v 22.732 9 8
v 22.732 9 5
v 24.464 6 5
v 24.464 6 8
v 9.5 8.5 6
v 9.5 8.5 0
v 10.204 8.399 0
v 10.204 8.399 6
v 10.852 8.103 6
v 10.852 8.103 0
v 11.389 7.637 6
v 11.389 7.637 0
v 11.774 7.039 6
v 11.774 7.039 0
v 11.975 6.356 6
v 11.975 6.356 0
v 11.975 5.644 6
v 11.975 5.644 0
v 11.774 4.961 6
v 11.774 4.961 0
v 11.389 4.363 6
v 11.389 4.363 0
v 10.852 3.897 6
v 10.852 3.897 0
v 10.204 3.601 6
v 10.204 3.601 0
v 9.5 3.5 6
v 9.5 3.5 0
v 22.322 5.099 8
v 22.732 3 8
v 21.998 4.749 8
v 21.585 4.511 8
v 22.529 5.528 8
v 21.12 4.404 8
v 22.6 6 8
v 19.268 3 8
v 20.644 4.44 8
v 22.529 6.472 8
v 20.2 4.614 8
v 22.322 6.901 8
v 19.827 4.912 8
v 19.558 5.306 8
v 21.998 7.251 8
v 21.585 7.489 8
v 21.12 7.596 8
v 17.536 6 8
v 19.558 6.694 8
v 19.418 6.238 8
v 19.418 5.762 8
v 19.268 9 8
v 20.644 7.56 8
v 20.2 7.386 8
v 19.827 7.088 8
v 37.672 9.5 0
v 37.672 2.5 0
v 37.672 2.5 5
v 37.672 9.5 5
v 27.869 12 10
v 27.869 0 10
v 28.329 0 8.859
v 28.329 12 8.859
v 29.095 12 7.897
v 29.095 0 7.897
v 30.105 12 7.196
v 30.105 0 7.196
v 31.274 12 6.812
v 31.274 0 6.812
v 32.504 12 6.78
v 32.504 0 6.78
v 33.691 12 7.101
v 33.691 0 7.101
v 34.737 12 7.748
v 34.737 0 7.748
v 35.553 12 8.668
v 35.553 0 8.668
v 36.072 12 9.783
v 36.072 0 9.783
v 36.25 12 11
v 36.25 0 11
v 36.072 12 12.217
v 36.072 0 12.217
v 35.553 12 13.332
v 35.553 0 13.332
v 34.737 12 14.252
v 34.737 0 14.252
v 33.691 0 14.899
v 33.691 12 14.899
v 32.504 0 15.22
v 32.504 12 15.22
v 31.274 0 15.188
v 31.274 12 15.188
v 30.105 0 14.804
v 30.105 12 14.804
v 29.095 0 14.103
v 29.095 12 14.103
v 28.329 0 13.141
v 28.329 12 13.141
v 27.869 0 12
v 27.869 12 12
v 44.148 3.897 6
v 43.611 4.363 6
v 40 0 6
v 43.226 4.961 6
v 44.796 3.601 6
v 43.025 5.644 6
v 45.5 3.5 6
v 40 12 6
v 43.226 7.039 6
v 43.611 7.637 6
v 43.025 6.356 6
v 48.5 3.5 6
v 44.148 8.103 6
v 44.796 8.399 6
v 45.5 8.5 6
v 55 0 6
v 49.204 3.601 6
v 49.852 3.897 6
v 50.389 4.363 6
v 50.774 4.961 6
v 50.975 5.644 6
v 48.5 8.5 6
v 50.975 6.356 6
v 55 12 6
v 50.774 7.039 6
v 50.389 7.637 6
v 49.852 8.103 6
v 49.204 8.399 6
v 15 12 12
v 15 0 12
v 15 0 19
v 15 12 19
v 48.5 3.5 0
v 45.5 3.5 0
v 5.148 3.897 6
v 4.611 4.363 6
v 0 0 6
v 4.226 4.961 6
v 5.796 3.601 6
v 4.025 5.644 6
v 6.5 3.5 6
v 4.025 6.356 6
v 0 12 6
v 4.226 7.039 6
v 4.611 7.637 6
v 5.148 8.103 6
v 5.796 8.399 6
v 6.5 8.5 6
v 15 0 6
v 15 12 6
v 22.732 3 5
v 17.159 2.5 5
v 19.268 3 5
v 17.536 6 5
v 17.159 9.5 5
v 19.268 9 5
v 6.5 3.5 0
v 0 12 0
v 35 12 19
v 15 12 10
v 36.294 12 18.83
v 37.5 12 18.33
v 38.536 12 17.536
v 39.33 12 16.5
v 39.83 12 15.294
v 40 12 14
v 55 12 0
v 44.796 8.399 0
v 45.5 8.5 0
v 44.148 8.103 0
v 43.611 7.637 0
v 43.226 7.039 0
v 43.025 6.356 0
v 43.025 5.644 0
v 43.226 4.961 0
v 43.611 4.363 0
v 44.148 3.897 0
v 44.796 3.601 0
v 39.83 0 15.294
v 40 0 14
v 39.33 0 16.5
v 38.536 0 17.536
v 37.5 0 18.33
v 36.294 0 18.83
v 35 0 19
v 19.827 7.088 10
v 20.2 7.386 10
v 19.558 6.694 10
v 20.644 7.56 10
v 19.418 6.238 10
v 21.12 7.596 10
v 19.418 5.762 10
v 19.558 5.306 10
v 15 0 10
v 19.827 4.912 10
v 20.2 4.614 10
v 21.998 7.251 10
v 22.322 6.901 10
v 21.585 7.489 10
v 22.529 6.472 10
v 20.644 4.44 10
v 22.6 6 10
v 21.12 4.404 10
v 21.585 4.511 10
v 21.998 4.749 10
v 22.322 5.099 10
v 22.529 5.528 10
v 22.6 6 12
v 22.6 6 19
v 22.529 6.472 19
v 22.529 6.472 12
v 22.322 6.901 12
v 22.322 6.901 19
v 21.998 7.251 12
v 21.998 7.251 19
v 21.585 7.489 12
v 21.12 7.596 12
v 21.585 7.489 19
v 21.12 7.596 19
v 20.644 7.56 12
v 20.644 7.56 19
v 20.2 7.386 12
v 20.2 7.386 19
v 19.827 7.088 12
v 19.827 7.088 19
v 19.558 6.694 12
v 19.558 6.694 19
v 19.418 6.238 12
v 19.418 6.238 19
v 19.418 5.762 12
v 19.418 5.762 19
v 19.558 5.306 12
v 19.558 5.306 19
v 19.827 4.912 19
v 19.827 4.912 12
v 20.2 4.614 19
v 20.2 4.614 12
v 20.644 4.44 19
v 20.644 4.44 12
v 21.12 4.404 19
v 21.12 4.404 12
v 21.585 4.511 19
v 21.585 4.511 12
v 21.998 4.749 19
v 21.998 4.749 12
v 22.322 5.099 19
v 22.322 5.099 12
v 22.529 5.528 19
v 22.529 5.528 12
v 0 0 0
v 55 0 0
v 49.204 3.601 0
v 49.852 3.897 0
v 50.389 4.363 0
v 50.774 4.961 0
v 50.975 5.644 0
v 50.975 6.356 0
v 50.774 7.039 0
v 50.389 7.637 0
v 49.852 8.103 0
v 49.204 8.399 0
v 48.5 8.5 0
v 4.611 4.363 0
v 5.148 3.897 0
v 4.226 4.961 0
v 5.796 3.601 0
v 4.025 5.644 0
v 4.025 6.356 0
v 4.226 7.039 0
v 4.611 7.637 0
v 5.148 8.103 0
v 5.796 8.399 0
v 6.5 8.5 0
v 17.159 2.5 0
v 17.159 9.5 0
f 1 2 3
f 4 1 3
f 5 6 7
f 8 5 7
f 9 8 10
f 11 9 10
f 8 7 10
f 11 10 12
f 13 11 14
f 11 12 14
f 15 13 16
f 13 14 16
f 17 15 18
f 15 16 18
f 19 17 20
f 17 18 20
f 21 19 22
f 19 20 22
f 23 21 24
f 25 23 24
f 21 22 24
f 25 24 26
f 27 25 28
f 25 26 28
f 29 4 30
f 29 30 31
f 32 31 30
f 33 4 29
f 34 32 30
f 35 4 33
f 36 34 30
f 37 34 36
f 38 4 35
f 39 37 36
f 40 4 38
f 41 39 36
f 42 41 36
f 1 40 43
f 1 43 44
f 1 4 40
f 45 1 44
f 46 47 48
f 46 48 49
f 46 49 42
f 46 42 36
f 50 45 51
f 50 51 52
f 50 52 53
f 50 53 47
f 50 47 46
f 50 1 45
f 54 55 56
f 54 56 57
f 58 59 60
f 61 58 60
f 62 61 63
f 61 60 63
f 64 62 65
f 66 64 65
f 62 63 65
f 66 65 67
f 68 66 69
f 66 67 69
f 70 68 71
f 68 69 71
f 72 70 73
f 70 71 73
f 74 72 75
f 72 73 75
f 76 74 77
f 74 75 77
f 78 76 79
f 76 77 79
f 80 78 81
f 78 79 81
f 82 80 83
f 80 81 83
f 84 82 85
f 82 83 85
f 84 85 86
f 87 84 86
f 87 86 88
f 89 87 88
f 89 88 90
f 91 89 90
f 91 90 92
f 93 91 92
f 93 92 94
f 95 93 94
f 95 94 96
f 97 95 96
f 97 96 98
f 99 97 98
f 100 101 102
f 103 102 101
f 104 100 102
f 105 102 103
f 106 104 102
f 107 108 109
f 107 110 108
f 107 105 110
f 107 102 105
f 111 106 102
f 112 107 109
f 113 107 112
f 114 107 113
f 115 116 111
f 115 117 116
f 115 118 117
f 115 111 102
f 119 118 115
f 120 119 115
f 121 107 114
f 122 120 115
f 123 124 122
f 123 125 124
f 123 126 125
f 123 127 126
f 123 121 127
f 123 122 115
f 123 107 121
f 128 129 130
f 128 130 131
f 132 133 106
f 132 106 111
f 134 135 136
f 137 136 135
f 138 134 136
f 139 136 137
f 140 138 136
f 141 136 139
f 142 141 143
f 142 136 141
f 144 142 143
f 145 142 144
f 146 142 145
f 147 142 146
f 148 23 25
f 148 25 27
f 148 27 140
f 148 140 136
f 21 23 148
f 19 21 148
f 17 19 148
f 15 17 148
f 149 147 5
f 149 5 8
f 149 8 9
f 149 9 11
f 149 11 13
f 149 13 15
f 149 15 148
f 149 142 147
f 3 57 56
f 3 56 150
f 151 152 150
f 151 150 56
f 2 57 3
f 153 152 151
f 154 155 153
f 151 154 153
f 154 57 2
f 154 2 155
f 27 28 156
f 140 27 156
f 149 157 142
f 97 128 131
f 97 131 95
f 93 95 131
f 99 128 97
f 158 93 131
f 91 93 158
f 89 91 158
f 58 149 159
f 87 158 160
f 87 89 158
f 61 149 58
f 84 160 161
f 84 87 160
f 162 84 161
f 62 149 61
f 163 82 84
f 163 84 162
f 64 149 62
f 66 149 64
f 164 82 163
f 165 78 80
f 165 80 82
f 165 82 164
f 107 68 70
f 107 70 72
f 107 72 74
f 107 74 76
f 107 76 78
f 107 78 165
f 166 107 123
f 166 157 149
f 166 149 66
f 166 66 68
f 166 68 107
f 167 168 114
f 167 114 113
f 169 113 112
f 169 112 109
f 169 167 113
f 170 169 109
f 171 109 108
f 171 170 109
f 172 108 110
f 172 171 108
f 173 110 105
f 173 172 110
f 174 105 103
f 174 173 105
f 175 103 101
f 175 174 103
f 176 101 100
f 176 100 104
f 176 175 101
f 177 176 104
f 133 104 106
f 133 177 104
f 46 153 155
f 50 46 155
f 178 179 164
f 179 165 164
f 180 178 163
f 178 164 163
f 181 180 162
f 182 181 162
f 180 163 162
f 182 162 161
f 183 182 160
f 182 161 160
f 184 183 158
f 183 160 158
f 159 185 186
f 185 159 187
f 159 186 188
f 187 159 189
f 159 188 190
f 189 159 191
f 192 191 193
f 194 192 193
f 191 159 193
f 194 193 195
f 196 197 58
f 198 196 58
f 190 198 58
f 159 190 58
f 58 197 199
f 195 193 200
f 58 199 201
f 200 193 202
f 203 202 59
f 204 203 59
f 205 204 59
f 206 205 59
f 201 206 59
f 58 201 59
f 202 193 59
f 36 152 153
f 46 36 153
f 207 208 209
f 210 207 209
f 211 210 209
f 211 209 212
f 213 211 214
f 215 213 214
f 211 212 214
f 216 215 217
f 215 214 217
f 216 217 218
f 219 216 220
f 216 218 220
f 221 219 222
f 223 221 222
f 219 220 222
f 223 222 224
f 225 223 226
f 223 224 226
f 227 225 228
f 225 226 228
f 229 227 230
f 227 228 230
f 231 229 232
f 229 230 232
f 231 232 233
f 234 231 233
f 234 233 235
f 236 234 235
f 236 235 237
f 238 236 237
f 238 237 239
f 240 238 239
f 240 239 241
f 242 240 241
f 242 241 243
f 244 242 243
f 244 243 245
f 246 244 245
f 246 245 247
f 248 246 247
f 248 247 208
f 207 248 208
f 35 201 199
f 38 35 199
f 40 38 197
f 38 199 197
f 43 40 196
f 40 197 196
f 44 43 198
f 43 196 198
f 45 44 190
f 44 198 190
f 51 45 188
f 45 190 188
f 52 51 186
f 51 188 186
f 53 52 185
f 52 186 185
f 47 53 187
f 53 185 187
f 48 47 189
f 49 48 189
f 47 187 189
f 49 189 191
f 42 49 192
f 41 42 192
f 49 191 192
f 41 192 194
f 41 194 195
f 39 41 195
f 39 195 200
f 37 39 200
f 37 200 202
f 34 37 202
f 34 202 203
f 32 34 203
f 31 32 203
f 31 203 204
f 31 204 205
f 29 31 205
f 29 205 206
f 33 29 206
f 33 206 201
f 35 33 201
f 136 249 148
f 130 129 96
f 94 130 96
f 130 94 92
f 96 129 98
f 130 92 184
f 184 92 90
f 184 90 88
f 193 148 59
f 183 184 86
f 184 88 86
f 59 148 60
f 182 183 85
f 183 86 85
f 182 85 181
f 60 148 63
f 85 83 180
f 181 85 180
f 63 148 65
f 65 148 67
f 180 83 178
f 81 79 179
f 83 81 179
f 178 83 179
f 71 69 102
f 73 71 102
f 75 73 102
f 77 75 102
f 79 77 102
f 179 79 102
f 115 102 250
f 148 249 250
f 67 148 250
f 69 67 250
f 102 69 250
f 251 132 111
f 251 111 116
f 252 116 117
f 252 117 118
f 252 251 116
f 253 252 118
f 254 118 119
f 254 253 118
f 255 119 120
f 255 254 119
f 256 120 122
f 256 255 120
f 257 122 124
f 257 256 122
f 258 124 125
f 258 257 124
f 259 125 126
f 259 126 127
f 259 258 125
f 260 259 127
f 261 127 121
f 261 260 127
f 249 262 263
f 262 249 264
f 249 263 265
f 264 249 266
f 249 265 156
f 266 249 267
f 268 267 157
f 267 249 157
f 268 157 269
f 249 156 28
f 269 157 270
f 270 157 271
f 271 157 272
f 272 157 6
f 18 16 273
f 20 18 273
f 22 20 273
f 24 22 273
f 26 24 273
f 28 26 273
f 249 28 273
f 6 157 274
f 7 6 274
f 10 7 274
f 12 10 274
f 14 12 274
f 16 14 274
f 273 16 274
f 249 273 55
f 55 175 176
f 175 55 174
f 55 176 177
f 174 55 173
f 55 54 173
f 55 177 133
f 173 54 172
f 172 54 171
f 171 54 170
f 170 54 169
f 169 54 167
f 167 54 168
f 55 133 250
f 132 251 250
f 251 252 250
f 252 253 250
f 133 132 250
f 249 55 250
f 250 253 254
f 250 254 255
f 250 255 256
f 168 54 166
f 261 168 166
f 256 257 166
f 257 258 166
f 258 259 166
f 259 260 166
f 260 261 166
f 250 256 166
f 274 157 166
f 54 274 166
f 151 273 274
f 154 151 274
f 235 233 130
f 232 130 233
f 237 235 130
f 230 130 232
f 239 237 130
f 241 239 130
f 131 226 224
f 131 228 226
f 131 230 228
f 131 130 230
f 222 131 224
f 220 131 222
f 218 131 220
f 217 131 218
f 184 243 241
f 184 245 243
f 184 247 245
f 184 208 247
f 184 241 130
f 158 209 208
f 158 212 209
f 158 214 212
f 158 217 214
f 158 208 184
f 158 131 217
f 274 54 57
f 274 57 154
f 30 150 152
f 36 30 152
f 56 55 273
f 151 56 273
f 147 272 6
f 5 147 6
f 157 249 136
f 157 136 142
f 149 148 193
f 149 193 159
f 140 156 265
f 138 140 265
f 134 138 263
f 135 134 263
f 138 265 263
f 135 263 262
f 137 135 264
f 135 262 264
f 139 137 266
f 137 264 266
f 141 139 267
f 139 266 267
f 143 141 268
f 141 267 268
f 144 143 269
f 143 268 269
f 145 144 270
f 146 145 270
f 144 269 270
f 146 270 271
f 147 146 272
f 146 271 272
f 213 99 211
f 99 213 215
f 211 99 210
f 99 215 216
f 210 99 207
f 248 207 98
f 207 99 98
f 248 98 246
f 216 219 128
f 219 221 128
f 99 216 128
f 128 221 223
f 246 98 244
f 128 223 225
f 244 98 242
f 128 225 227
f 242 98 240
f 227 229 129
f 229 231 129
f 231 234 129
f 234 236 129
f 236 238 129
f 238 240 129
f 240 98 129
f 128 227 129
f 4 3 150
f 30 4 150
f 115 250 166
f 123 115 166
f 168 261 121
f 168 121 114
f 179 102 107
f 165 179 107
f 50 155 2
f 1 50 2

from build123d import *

# Parameters (mm, degrees)
SKETCH2_W           = 55
SKETCH2_H           = 12
BOSS_EXTRUDE1_DEPTH = 6
SKETCH3_W           = 25
SKETCH3_H           = 12
BOSS_EXTRUDE2_DEPTH = 13
FILLET1_R           = 5
SKETCH4_R           = 4.25
CUT_EXTRUDE2_DEPTH  = 30
SKETCH5_W           = 20.513890507
SKETCH5_H           = 7
CUT_EXTRUDE3_DEPTH  = 5
SKETCH6_R           = 1.6
CUT_EXTRUDE4_DEPTH  = 11
CUT_EXTRUDE5_DEPTH  = 3


with BuildPart() as part:
    # Sketch2 → Boss-Extrude1 (new body)
    with BuildSketch(Plane.XY):
        with Locations((27.5, 6)):
            Rectangle(SKETCH2_W, SKETCH2_H)
        with BuildLine():
            Line((6.5, 8.5), (9.5, 8.5))
            ThreePointArc((9.5, 8.5), (12, 6), (9.5, 3.5))
            Line((9.5, 3.5), (6.5, 3.5))
            ThreePointArc((6.5, 3.5), (4, 6), (6.5, 8.5))
        make_face(mode=Mode.SUBTRACT)
        with BuildLine():
            Line((48.5, 8.5), (45.5, 8.5))
            ThreePointArc((45.5, 8.5), (43, 6), (45.5, 3.5))
            Line((45.5, 3.5), (48.5, 3.5))
            ThreePointArc((48.5, 3.5), (51, 6), (48.5, 8.5))
        make_face(mode=Mode.SUBTRACT)
    extrude(amount=BOSS_EXTRUDE1_DEPTH)

    # Sketch3 → Boss-Extrude2 (add)
    with BuildSketch(Plane.XY.offset(6)):
        with Locations((27.5, 6)):
            Rectangle(SKETCH3_W, SKETCH3_H)
    extrude(amount=BOSS_EXTRUDE2_DEPTH)

    # Fillet1
    fillet1_edges = [part.edges().sort_by_distance(p)[0] for p in [
        (40, 6, 19),
    ]]
    fillet(fillet1_edges, radius=FILLET1_R)

    # Sketch4 → Cut-Extrude2 (cut)
    with BuildSketch(Plane.XZ):
        with BuildLine():
            ThreePointArc((27.86932209, 10), (27.75, 11), (27.86932209, 12))
            Line((27.86932209, 12), (15, 12))
            Line((15, 12), (15, 10))
            Line((15, 10), (27.86932209, 10))
        make_face()
        with Locations((32, 11)):
            Circle(SKETCH4_R)
    extrude(amount=-CUT_EXTRUDE2_DEPTH, mode=Mode.SUBTRACT)

    # Sketch5 → Cut-Extrude3 (cut)
    with BuildSketch(Plane(origin=(0, 0, 0), x_dir=(-1, 0, 0), z_dir=(0, 0, -1))):
        with Locations((-27.415473723, 6)):
            Rectangle(SKETCH5_W, SKETCH5_H)
    extrude(amount=-CUT_EXTRUDE3_DEPTH, mode=Mode.SUBTRACT)

    # Sketch6 → Cut-Extrude4 (cut)
    with BuildSketch(Plane.XY.offset(19)):
        with Locations((21, 6)):
            Circle(SKETCH6_R)
    extrude(amount=-CUT_EXTRUDE4_DEPTH, mode=Mode.SUBTRACT)

    # Sketch7 → Cut-Extrude5 (cut)
    with BuildSketch(Plane(origin=(0, 0, 5), x_dir=(-1, 0, 0), z_dir=(0, 0, -1))):
        Polygon((-17.535898385, 6), (-19.267949192, 9), (-22.732050808, 9), (-24.464101615, 6), (-22.732050808, 3), (-19.267949192, 3), align=None)
    extrude(amount=-CUT_EXTRUDE5_DEPTH, mode=Mode.SUBTRACT)


solid = part.part
